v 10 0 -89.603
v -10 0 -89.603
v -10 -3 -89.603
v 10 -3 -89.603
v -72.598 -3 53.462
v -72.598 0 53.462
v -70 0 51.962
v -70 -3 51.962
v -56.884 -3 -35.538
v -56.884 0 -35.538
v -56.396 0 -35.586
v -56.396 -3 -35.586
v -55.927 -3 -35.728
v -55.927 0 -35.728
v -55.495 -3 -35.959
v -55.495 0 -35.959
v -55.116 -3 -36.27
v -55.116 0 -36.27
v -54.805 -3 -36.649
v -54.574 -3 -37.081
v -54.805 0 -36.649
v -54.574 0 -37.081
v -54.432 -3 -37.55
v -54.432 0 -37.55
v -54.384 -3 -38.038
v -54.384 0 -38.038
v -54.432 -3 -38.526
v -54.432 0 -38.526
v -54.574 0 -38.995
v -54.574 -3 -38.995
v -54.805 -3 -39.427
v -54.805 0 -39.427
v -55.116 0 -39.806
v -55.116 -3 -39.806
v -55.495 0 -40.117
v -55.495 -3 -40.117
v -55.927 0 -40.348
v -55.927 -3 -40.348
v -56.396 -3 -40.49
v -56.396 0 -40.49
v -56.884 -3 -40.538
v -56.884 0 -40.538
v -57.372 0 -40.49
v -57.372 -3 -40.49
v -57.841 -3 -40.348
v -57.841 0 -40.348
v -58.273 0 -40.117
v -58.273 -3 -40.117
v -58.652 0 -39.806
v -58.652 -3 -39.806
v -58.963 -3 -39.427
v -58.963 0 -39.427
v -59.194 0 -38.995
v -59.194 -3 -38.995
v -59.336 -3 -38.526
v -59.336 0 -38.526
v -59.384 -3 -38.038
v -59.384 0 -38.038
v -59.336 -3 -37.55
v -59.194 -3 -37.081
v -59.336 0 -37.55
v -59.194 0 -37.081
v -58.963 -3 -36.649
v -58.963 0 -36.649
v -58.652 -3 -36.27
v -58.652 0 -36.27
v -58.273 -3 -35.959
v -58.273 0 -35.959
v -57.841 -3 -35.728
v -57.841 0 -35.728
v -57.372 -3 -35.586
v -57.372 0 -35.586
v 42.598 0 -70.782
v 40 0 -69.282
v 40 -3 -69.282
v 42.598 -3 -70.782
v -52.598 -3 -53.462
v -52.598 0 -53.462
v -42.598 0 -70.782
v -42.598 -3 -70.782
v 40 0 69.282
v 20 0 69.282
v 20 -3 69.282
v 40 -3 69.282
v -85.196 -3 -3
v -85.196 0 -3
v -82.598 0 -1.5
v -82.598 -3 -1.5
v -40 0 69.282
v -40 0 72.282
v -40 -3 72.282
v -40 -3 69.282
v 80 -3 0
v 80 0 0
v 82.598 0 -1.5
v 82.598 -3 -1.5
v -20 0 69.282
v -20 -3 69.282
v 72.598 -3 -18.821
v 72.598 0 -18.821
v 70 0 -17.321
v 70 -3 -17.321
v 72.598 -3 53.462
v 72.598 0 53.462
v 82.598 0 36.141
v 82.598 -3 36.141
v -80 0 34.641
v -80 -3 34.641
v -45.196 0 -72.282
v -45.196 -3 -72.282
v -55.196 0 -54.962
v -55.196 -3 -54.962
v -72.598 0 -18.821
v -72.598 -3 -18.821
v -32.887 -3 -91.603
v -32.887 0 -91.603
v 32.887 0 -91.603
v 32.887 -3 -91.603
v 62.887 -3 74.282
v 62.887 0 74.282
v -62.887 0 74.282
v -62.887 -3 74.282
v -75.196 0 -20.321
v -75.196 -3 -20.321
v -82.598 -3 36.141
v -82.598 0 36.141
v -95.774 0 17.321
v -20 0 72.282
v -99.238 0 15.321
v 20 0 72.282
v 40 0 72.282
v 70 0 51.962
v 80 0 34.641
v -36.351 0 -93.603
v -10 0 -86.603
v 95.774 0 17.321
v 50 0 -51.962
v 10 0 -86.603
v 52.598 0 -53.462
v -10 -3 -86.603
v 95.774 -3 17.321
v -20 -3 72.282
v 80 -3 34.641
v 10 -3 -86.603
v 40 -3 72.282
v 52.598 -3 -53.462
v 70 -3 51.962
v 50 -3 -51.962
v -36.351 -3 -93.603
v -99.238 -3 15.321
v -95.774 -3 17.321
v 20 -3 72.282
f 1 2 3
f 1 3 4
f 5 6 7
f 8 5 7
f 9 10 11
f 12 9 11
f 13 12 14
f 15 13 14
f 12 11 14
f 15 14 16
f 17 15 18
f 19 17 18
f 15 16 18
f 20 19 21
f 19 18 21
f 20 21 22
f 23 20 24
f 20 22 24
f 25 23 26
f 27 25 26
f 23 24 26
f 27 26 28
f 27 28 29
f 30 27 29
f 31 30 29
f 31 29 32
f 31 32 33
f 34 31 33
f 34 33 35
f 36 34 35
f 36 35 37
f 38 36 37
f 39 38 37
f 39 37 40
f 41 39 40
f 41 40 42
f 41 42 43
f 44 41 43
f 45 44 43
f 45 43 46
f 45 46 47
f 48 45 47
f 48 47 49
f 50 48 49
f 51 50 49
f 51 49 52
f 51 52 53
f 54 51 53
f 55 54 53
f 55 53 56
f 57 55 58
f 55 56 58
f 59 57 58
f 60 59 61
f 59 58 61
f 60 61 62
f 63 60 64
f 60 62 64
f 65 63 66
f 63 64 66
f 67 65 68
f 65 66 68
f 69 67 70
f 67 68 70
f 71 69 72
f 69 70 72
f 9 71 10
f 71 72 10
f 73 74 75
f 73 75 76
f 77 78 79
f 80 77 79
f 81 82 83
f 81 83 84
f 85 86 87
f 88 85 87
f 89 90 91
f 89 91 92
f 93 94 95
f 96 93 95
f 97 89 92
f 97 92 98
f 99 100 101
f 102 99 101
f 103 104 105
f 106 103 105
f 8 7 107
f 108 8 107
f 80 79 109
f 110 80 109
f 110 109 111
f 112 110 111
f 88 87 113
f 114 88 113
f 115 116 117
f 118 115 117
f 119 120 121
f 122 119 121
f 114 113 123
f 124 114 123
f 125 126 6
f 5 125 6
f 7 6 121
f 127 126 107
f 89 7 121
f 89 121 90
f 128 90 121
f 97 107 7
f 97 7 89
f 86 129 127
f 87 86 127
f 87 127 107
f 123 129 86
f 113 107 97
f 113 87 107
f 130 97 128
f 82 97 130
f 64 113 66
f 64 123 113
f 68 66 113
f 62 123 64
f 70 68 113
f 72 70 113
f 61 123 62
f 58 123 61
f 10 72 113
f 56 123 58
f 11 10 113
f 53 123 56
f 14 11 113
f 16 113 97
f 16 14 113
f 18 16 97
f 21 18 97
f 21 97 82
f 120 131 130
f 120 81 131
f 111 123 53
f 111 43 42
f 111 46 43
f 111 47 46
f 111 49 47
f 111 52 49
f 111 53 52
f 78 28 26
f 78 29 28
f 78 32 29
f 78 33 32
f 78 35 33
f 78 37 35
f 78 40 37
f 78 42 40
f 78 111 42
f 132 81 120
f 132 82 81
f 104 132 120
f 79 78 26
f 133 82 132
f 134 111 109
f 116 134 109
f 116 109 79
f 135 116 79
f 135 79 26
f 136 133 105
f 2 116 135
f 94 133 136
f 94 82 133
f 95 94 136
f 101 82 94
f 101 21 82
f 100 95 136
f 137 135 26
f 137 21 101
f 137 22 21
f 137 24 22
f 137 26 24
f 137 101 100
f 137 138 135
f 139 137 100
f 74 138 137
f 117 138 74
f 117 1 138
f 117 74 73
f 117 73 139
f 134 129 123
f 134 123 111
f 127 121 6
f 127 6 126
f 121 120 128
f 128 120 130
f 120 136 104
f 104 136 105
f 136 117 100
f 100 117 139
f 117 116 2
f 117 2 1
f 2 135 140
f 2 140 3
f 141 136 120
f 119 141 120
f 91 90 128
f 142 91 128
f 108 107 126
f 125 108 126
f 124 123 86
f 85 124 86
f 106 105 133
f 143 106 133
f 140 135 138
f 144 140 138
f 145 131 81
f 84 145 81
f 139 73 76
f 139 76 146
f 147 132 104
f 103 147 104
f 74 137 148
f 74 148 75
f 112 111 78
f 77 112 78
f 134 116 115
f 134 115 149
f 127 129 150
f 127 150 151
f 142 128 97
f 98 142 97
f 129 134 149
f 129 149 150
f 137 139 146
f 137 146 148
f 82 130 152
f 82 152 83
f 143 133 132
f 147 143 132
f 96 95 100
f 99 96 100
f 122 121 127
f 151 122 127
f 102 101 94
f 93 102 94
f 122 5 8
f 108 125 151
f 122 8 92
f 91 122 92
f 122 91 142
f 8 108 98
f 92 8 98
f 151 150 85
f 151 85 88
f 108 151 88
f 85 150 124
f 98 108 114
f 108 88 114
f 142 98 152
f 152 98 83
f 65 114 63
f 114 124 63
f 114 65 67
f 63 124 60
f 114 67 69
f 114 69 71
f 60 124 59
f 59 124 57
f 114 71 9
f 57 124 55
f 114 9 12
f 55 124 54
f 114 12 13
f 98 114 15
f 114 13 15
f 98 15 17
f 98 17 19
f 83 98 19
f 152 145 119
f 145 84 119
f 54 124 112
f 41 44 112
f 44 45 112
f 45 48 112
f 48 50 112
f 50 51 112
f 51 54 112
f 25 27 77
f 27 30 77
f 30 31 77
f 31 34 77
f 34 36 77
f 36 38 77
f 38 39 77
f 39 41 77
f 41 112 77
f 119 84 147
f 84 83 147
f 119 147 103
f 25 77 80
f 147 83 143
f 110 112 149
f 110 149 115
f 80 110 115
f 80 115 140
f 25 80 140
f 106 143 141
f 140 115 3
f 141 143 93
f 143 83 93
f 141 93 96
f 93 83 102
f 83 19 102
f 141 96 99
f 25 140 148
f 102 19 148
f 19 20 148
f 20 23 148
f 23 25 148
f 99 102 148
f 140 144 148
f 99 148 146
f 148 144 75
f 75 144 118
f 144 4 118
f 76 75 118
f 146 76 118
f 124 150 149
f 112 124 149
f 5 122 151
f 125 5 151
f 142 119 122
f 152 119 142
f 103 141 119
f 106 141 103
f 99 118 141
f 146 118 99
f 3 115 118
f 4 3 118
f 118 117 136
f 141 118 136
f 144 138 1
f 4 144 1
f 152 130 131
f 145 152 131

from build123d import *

# Parameters (mm, degrees)
BOSS_EXTRUDE1_DEPTH = 3
BOSS_EXTRUDE2_DEPTH = 3
SKETCH6_R           = 2.5
CUT_EXTRUDE1_DEPTH  = 137.449762455
SKETCH7_W           = 20
SKETCH7_H           = 3
CUT_EXTRUDE2_DEPTH  = 137.449762455


with BuildPart() as part:
    # Sketch4 → Boss-Extrude1 (new body)
    with BuildSketch(Plane(origin=(0, 0, 0), x_dir=(1, 0, 0), z_dir=(0, 1, 0))):
        Polygon((-32.886751346, 91.602540378), (32.886751346, 91.602540378), (95.773502692, -17.320508076), (62.886751346, -74.282032303), (-62.886751346, -74.282032303), (-95.773502692, -17.320508076), align=None)
    extrude(amount=-BOSS_EXTRUDE1_DEPTH)

    # Sketch5 → Boss-Extrude2 (add, through all)
    with BuildSketch(Plane(origin=(0, 0, 0), x_dir=(1, 0, 0), z_dir=(0, 1, 0))):
        Polygon((-95.773502692, -17.320508076), (-32.886751346, 91.602540378), (-36.350852961, 93.602540378), (-99.237604307, -15.320508076), align=None)
    extrude(amount=-BOSS_EXTRUDE2_DEPTH)

    # Sketch6 → Cut-Extrude1 (cut, through all)
    with BuildSketch(Plane(origin=(0, 0, 0), x_dir=(1, 0, 0), z_dir=(0, 1, 0))):
        with Locations(Location((-56.883974596, 38.038130468, 0), (0, 0, 270))):
            Circle(SKETCH6_R)
    extrude(amount=-CUT_EXTRUDE1_DEPTH, mode=Mode.SUBTRACT)

    # Sketch7 → Cut-Extrude2 (cut, through all)
    with BuildSketch(Plane(origin=(0, 0, 0), x_dir=(1, 0, 0), z_dir=(0, 1, 0))):
        with Locations((0, 88.102540378)):
            Rectangle(SKETCH7_W, SKETCH7_H)
        with Locations((-30, -70.782032303)):
            Rectangle(SKETCH7_W, SKETCH7_H)
        with Locations((30, -70.782032303)):
            Rectangle(SKETCH7_W, SKETCH7_H)
        Polygon((50, 51.961524227), (40, 69.282032303), (42.598076211, 70.782032303), (52.598076211, 53.461524227), align=None)
        Polygon((72.598076211, 18.820508076), (70, 17.320508076), (80, 0), (82.598076211, 1.5), align=None)
        Polygon((80, -34.641016151), (70, -51.961524227), (72.598076211, -53.461524227), (82.598076211, -36.141016151), align=None)
        Polygon((-70, -51.961524227), (-80, -34.641016151), (-82.598076211, -36.141016151), (-72.598076211, -53.461524227), align=None)
        Polygon((-45.196152423, 72.282032303), (-55.196152423, 54.961524227), (-52.598076211, 53.461524227), (-42.598076211, 70.782032303), align=None)
        Polygon((-75.196152423, 20.320508076), (-85.196152423, 3), (-82.598076211, 1.5), (-72.598076211, 18.820508076), align=None)
    extrude(amount=-CUT_EXTRUDE2_DEPTH, mode=Mode.SUBTRACT)


solid = part.part
